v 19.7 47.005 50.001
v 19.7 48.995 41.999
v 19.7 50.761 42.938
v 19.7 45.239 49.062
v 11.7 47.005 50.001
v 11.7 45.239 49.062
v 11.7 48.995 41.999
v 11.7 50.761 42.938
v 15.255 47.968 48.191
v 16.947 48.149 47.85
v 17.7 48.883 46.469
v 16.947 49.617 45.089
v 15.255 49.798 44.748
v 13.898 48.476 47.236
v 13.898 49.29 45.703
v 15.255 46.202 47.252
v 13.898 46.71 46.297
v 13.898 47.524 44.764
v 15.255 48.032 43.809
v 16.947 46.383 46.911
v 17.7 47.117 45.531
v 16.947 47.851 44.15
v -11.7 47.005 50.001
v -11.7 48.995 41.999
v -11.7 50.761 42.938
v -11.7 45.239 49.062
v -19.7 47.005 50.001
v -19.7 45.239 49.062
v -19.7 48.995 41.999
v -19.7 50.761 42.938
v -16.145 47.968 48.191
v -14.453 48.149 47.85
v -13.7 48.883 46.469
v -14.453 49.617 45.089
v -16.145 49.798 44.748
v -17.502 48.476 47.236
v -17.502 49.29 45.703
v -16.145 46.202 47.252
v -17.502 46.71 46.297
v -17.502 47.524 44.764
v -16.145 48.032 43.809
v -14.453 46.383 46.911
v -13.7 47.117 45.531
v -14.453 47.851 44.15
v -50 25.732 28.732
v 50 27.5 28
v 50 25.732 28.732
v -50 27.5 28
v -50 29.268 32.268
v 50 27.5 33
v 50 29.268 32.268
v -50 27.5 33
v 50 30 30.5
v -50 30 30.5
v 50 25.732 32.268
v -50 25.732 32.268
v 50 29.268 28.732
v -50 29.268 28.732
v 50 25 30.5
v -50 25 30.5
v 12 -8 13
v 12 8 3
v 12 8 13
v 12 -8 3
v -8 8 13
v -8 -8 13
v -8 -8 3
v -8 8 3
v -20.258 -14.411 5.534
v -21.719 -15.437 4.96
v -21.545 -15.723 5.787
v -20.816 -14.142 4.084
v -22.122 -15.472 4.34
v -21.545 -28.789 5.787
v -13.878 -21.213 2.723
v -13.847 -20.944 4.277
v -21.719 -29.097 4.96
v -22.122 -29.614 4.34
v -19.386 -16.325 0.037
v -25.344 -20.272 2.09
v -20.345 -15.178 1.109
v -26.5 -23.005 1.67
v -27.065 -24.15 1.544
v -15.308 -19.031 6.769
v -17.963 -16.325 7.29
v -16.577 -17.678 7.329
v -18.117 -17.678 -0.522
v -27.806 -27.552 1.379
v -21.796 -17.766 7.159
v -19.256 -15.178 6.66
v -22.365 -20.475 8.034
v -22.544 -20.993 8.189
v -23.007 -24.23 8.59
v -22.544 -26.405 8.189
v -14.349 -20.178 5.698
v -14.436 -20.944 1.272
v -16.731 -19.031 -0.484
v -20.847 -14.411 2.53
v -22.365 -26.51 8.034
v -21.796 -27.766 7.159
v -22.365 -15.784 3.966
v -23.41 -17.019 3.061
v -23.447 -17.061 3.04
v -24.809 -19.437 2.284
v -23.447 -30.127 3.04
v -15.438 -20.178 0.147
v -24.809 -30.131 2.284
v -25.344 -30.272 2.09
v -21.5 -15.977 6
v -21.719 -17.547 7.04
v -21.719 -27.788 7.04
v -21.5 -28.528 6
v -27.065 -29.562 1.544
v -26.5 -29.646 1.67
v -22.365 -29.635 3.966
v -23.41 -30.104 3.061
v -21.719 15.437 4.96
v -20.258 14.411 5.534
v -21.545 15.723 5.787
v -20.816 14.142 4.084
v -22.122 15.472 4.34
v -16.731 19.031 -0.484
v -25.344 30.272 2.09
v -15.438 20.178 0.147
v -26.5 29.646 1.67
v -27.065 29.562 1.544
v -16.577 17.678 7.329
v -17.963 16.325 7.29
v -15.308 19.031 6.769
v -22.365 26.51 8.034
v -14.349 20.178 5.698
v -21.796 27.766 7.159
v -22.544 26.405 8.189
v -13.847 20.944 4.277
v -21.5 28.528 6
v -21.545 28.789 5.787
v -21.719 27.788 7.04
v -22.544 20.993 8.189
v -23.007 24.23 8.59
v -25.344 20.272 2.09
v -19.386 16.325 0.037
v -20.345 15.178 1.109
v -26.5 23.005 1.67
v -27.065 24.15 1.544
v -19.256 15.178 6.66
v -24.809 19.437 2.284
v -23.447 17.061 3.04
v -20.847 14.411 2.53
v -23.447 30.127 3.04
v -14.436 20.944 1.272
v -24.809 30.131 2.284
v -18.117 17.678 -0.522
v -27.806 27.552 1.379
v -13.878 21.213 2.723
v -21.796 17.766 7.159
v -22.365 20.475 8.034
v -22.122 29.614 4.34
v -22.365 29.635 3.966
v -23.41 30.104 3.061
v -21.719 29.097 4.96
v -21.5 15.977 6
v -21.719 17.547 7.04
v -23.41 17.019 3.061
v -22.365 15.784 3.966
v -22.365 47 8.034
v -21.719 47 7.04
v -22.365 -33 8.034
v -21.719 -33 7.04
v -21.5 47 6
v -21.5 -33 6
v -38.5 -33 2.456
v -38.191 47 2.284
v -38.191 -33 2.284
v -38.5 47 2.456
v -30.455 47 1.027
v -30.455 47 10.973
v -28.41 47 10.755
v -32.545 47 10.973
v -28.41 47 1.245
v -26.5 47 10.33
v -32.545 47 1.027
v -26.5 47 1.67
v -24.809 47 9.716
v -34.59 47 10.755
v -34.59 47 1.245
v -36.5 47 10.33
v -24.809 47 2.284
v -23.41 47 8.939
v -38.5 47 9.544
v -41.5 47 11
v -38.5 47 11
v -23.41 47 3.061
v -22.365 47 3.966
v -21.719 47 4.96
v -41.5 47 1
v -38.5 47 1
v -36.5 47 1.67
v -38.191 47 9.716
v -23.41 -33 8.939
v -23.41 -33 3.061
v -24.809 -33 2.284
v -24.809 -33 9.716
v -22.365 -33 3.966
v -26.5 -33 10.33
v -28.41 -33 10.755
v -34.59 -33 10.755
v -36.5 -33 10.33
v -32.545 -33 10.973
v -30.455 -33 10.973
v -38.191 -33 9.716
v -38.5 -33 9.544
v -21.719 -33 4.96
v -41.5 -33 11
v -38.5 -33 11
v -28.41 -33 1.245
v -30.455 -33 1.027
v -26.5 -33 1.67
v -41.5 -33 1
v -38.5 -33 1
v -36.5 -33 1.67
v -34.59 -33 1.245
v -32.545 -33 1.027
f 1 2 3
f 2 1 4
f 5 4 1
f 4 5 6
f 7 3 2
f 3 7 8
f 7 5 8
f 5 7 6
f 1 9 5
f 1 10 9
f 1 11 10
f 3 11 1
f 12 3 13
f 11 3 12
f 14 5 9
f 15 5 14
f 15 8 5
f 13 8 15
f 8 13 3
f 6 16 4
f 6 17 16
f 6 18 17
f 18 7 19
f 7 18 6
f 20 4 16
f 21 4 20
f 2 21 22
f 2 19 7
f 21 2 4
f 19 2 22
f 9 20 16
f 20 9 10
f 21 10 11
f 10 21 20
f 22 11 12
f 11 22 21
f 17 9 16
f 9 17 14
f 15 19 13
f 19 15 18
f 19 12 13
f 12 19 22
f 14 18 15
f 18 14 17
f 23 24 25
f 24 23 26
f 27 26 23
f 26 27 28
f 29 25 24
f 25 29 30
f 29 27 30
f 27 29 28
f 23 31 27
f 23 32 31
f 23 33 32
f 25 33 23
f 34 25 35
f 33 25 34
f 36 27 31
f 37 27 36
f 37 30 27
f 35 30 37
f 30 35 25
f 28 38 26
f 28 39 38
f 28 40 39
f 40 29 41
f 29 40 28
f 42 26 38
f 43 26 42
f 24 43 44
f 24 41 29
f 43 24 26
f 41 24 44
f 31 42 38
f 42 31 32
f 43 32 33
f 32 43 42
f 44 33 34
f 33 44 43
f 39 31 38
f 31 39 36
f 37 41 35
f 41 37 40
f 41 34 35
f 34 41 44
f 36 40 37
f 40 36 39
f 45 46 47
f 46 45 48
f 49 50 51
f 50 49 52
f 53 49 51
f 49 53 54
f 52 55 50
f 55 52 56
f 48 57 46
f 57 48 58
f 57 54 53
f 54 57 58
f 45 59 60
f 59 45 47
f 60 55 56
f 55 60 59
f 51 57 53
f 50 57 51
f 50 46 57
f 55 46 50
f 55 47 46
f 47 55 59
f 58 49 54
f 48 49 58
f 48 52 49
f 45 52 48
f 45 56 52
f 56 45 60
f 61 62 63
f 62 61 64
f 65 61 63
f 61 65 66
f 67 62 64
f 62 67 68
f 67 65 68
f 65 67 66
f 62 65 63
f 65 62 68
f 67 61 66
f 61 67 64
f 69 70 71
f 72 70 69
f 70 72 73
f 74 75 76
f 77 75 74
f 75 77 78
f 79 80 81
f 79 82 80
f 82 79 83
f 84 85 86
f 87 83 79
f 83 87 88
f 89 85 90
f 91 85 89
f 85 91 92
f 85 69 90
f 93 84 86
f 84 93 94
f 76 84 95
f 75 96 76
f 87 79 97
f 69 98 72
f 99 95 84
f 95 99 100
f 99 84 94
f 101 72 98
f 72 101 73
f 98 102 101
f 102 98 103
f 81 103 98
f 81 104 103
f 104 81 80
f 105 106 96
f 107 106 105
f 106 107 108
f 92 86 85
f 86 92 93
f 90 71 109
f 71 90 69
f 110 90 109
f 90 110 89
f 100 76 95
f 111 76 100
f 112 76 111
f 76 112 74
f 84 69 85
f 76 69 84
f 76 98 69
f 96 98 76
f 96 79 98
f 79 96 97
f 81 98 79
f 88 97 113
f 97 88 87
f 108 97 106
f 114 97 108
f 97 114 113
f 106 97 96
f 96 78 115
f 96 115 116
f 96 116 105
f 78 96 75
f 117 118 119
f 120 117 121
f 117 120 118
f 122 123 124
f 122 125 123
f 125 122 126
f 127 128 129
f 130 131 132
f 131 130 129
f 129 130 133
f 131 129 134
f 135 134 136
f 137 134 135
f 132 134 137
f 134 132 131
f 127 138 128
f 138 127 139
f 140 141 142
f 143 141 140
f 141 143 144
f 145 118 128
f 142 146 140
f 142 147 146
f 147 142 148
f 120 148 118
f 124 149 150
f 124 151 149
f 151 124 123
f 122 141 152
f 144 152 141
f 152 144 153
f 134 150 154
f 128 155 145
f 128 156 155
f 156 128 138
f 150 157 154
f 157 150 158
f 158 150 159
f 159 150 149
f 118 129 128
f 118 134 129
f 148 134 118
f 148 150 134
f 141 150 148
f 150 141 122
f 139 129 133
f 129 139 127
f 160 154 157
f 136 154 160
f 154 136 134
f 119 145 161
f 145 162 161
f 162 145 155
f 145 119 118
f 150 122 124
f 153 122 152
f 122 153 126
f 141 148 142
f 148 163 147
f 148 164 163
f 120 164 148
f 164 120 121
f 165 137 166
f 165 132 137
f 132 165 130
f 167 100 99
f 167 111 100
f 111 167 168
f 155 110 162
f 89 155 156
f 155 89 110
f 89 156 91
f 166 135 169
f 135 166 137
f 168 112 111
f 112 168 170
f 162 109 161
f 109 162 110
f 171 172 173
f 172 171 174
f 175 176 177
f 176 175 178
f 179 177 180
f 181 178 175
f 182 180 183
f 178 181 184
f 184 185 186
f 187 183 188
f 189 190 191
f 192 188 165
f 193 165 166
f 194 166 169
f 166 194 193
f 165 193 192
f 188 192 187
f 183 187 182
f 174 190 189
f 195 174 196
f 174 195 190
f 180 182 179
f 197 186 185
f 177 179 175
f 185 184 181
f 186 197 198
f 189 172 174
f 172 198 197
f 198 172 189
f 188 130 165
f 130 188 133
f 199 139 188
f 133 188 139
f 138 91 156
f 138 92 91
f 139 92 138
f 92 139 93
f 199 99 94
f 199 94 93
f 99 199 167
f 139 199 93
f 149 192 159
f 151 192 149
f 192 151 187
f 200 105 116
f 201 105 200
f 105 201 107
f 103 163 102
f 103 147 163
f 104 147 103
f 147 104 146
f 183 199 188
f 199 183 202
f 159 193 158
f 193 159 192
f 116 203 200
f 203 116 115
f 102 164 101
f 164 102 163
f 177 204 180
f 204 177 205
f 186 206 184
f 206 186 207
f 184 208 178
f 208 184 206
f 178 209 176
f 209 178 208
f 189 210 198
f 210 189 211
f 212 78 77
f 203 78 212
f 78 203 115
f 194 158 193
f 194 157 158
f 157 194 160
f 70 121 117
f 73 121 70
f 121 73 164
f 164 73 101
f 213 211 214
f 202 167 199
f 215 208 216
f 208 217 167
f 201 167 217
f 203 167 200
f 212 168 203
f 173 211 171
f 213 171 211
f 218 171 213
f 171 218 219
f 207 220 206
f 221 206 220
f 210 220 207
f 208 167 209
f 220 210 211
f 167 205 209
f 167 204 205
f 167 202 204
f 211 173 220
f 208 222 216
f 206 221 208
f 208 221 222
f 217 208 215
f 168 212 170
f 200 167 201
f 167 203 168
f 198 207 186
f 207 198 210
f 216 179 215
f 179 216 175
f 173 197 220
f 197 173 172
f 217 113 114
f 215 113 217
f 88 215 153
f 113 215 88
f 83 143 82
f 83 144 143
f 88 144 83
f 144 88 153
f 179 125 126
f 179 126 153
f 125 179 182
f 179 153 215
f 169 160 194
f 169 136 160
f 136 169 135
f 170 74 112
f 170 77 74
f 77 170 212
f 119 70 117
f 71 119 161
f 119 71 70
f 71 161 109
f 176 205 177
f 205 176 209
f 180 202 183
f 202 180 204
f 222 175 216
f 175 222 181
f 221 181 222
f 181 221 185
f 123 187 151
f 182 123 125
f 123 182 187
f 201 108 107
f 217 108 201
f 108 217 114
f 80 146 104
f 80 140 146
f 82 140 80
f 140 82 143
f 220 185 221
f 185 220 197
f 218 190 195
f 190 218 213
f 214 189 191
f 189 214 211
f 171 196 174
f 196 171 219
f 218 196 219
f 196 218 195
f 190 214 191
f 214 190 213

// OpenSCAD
module nose(){
	scale([1,0.8,1])  cylinder(16 ,r=3);
}


module noses(){
	difference(){
		rotate([0,11.1,0]){
			rotate([90,0,-45]) translate([0,0,24]) nose();
			rotate([90,0,-45-90]) translate([0,0,24]) nose();
		}
		translate([-47,-50,0]) cube([20,100,50]);
	}
}

module channel_out(){
	translate([-31.5,15,6])rotate([90,0,0]) scale([1,0.5,1]) 
		cylinder(46,r=8);
	intersection(){
		union(){
			translate([-34.7,45,6])rotate([90,0,0]) scale([0.64,0.5,1]) 
				cylinder(31,r=8.3);	
			translate([-26,31,6])rotate([90,0,0]) //scale([1,0.5,1]) 
				cylinder(20,r=3);
		}
		translate([-31.5,46,6])rotate([90,0,0]) scale([1,0.5,1]) 
			cylinder(76,r=8);
	}
}

module channel_in(){

	difference(){
		translate([0,63,36.2]) rotate([118,0,0])
			cylinder(90,r=15.5,center=true);
		cube([100,69.5,100],center=true);
		cube([100,100,17],center=true);
	}
	intersection(){
		translate([0,40,0]) cube([100,10,100],center=true);
	
		translate([-36,40,5]) rotate([0,65,0]) cylinder(40,r1=3,r2=15);
	}
}


module inner(){
	noses();
	channel_out();
	channel_in();
}

module nose_body(){
	scale([1,0.8,1]) cylinder(15 ,r=5);
}

module noses_body(){
	rotate([0,11.1,0]){
		rotate([90,0,-45]) translate([0,0,25]) nose_body();
		rotate([90,0,-45-90]) translate([0,0,25]) nose_body();
	}
}

module channel_body(){
	translate([-31.5,47,6])rotate([90,0,0]) scale([1,0.5,1]) 
		cylinder(80,r=10);
	translate([-41.5,47,1])rotate([90,0,0]) 
		cube([3,10,80]);
}

module fan_frame(){
	translate([0,63,36.2]) rotate([28,0,0])
	difference(){
		translate([0,-6.5,0])cube([41.5,3,41.5],center=true);
//		rotate([90,0,0])cylinder(20,r=15.5,center=true);
		translate([15.7,0,15.7])rotate([90,0,0])cylinder(20,r=2,center=true);
		translate([-15.7,0,15.7])rotate([90,0,0])cylinder(20,r=2,center=true);
		translate([15.7,0,-15.7])rotate([90,0,0])cylinder(20,r=2,center=true);
		translate([-15.7,0,-15.7])rotate([90,0,0])cylinder(20,r=2,center=true);
	}
}

module tube(){
	difference(){
		translate([0,63,36.2]) rotate([118,0,0])
			cylinder(90,r=17,center=true);
		cube([100,67.5,100],center=true);
		cube([100,100,15],center=true);
	

	translate([0,63,36.2]) rotate([28,0,0])
		translate([0,42.5,0])cube([41.5,100,41.5],center=true);	
	}
}

module outer(){
	
	noses_body();
	channel_body();

	//fan_frame();
	//tube();

	//cube([100,100,20])
}

module base(){

	#translate([-50,27.5,30.5])rotate([90,0,90]) cylinder(100,r=2.5);
	#translate([-8,-8,3])cube([20,16,10]);

	#translate([0,48,46]){
		translate([15.7,0,0])rotate([28,0,0])difference(){
			cube([8,2,8],center=true);
			rotate([90,0,0])cylinder(10,r=2,center=true);
		}
		translate([-15.7,0,0])rotate([28,0,0])difference(){
			cube([8,2,8],center=true);
			rotate([90,0,0])cylinder(10,r=2,center=true);
		}	
	}

}

module fan(){
	#translate([0,63,36.2]) rotate([28,0,0])
	difference(){
		cube([41.5,10,41.5],center=true);
		rotate([90,0,0])cylinder(20,r=15.5,center=true);
		translate([15.7,0,15.7])rotate([90,0,0])cylinder(20,r=2,center=true);
		translate([-15.7,0,15.7])rotate([90,0,0])cylinder(20,r=2,center=true);
		translate([15.7,0,-15.7])rotate([90,0,0])cylinder(20,r=2,center=true);
		translate([-15.7,0,-15.7])rotate([90,0,0])cylinder(20,r=2,center=true);
	}
}

base();
//fan();

//fan_frame();

//rotate([0,-90,0])
//difference(){
	outer();
	%inner();
//}
